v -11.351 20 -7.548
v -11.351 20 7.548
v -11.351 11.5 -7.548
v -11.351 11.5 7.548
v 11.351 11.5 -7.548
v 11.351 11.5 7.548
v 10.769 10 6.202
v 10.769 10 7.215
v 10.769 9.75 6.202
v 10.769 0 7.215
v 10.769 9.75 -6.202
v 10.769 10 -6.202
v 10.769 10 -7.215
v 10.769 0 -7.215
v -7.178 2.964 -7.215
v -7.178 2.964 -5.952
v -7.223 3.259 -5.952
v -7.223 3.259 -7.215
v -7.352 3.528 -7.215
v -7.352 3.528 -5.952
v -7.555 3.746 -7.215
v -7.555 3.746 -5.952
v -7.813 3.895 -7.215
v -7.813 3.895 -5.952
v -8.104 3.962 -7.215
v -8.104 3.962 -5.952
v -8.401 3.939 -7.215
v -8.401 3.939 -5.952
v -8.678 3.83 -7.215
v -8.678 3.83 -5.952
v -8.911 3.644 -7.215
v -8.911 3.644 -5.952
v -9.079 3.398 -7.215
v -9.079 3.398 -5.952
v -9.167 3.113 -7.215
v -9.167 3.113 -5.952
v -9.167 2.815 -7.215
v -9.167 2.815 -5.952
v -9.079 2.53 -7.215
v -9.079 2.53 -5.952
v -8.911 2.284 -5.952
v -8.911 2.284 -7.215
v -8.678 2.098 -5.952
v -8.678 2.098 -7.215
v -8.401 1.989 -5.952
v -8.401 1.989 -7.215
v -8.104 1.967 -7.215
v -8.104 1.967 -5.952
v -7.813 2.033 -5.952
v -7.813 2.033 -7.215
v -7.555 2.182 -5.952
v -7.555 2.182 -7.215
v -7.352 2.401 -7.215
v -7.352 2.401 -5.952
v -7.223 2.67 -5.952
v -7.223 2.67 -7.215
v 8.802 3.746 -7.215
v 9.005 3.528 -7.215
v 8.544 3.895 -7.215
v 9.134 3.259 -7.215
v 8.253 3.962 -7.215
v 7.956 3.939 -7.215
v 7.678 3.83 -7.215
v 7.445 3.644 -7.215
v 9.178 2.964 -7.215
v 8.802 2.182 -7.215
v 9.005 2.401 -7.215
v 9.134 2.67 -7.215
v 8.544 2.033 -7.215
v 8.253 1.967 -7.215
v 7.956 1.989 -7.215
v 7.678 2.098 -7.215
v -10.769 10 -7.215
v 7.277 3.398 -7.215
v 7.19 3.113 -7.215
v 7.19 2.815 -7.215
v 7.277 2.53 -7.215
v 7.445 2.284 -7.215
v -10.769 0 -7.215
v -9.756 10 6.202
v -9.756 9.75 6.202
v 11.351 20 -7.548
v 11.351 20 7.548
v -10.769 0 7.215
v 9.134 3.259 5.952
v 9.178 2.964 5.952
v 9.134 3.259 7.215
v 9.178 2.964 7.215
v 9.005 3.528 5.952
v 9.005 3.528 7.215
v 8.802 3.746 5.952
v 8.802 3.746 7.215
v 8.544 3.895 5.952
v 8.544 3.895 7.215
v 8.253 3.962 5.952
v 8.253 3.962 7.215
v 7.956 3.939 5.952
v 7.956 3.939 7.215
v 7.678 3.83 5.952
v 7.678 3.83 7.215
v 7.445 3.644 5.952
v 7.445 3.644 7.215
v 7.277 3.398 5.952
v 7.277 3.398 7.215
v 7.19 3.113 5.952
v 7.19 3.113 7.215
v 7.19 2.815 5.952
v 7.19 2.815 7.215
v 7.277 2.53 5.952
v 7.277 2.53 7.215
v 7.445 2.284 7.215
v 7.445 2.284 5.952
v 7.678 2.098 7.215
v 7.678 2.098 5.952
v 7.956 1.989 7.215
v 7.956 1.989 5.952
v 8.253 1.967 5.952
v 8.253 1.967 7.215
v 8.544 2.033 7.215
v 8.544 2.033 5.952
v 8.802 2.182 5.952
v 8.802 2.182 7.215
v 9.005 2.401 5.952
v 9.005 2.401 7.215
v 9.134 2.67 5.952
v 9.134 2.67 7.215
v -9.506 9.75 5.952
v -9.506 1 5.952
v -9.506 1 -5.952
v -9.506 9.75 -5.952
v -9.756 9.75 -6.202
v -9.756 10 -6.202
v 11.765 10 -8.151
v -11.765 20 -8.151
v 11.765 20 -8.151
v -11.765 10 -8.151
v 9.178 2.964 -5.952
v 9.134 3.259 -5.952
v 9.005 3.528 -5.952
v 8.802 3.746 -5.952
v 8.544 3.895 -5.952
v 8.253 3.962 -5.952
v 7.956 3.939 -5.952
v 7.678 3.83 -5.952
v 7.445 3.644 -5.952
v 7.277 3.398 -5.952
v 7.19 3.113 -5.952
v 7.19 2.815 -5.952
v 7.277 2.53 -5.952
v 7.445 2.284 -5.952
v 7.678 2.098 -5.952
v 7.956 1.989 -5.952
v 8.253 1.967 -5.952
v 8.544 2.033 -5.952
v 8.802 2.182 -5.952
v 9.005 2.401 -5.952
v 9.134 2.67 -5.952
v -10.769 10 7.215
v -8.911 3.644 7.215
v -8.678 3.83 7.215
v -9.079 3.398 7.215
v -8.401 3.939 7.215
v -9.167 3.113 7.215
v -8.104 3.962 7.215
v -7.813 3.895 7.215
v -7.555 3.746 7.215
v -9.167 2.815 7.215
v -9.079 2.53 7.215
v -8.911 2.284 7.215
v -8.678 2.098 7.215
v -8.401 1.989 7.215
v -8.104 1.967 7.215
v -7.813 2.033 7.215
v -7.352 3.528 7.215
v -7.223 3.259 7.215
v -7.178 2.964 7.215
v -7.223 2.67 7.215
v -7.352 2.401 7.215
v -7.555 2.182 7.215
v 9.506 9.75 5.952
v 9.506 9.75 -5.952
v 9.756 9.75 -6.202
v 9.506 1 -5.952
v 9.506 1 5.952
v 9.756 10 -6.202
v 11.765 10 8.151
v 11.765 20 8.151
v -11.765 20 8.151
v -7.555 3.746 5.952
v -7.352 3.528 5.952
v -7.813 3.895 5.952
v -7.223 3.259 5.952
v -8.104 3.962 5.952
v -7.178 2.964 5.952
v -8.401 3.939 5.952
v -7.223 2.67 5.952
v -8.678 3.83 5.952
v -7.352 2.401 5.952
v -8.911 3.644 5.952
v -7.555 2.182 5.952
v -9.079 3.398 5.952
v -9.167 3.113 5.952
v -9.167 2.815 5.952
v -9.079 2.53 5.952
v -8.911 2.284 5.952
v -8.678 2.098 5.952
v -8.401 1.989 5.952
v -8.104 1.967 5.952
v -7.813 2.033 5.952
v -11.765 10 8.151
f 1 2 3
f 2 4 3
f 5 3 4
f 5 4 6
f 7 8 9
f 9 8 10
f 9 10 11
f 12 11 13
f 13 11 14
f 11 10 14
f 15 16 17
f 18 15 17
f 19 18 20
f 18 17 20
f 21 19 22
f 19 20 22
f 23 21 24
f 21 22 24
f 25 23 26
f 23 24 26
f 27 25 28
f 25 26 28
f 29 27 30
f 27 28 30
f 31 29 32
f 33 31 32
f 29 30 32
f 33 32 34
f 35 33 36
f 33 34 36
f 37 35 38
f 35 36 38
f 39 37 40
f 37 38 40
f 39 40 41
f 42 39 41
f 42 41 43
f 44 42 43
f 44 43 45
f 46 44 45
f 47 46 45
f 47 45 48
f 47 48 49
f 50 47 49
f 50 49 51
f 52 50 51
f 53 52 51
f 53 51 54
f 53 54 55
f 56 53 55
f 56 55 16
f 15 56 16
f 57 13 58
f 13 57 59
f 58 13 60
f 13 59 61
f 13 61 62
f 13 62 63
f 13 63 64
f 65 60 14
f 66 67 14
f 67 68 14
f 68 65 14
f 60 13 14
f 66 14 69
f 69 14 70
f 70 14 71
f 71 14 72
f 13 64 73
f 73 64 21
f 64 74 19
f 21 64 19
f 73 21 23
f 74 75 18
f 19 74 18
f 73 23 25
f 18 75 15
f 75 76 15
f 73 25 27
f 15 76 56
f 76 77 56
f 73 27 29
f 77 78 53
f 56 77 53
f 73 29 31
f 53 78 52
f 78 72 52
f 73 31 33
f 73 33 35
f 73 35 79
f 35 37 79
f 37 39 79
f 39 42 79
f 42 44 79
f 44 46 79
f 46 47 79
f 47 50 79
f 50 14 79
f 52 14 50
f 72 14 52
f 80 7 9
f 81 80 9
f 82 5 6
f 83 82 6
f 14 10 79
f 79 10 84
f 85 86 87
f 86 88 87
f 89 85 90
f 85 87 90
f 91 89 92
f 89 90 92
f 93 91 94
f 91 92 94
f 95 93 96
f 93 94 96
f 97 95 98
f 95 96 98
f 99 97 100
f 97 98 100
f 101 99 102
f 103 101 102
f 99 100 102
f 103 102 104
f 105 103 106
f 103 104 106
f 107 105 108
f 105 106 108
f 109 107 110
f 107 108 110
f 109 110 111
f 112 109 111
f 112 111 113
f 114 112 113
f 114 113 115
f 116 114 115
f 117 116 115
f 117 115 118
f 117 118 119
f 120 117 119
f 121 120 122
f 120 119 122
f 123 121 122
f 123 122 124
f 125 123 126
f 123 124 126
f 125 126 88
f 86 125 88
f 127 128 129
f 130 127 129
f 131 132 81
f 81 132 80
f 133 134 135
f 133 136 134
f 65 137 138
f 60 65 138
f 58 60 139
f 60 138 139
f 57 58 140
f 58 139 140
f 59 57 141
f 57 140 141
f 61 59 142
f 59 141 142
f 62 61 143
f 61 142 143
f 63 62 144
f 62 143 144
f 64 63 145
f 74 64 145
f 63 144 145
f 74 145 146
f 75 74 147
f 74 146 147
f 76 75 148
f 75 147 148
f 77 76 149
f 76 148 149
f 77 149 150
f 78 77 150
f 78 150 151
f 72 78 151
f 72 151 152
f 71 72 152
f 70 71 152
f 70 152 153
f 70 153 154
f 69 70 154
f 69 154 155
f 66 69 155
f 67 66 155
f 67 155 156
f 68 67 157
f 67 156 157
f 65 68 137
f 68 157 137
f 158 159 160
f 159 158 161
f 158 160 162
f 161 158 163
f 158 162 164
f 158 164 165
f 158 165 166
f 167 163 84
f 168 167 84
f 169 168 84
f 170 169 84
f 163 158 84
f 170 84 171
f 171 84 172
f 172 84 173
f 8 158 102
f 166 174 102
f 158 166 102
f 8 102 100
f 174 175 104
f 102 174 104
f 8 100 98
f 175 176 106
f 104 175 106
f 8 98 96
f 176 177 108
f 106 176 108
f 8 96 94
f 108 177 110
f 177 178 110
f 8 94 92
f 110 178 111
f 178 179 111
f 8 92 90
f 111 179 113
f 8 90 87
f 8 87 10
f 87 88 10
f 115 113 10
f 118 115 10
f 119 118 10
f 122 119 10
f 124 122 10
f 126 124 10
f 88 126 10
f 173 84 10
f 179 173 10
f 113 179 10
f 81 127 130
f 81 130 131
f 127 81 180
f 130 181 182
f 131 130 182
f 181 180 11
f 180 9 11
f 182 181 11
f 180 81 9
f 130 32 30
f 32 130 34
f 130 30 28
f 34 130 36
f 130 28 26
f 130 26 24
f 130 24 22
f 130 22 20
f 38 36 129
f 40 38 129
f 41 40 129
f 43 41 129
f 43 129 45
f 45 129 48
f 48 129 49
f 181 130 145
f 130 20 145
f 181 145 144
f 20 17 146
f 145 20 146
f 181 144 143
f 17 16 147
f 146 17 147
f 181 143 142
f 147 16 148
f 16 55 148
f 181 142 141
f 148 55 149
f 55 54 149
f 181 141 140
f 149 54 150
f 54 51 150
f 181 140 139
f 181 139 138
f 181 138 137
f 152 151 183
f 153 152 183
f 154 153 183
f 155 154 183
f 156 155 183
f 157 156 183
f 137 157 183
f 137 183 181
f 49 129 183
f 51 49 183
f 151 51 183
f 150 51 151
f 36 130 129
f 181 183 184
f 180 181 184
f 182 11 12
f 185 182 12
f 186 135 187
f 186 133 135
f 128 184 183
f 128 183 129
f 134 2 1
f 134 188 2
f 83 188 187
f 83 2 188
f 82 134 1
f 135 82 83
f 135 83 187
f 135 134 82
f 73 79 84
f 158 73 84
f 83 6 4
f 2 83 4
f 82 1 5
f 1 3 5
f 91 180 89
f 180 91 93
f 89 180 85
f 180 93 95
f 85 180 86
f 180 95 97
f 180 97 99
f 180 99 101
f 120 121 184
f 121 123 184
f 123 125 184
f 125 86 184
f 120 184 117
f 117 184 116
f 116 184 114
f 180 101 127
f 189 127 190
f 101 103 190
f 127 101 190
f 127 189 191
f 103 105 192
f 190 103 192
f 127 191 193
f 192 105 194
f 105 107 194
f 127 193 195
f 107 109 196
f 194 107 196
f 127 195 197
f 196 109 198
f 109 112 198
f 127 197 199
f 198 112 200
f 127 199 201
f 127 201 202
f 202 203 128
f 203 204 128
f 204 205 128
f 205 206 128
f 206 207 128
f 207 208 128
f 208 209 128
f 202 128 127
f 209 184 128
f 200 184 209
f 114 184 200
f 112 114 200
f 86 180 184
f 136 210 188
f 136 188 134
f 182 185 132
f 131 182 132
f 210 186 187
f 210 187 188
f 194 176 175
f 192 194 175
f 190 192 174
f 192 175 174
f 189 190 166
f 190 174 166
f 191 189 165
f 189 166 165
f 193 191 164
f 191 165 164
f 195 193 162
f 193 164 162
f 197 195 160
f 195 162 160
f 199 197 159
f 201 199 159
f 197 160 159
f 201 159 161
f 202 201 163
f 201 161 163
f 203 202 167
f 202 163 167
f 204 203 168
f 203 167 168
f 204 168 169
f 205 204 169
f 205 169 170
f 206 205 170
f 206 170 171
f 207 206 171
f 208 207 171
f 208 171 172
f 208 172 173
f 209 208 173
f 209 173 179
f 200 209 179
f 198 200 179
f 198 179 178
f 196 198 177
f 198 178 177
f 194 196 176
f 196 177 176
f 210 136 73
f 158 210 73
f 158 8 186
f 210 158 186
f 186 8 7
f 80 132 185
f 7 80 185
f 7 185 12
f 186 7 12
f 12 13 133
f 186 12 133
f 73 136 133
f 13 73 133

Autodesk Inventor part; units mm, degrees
ref_plane "YZ Plane" through (0, 0, 0) normal (1, 0, 0) x (0, 1, 0)
ref_plane "XZ Plane" through (0, 0, 0) normal (0, 1, 0) x (-1, 0, 0)
ref_plane "XY Plane" through (0, 0, 0) normal (0, 0, 1) x (1, 0, 0)
sketch "Sketch1" plane through (0, 0, 0) normal (0, 1, 0) x (-1, 0, 0)
  point P0 (0, 0)
sketch "Sketch2" plane through (0, 0, 0) normal (0, 1, 0) x (-1, 0, 0)
  line L0 (-10.7689, -7.215) -> (10.7689, -7.215)
  line L1 (10.7689, -7.215) -> (10.7689, 7.215)
  line L2 (10.7689, 7.215) -> (-10.7689, 7.215)
  line L3 (-10.7689, 7.215) -> (-10.7689, -7.215)
  line L4 (-10.7689, -7.215) -> (10.7689, 7.215) construction
  line L5 (10.7689, -7.215) -> (-10.7689, 7.215) construction
  line L6 (9.5058, 5.9518) -> (9.5058, -5.9518)
  line L7 (9.5058, -5.9518) -> (-9.5058, -5.9518)
  line L8 (-9.5058, -5.9518) -> (-9.5058, 5.9518)
  line L9 (-9.5058, 5.9518) -> (9.5058, 5.9518)
  point P0 (0, 0)
extrude "Extrusion1" add sketch "Sketch2" along normal blind 10
sketch "Sketch3" plane through (-10.7689, 0, 7.215) normal (0, 0, 1) x (1, 0, 0)
  circle A0 centre (2.5905, 2.9643) radius 1
  line L0 (20.2747, 10) -> (1.2632, 10) projected
  line L1 (10.7689, 10) -> (10.7689, 0)
  circle A1 centre (18.9473, 2.9643) radius 1
  dimension "d2" = 2
extrude "Extrusion2" cut sketch "Sketch3" against normal through all
extrude "Extrusion3" add sketch "Sketch2" along normal blind 1 contours L6 L7 L8 L9
sketch "Sketch4" plane through (10.7689, 0, 7.215) normal (1, 0, 0) x (0, 0, -1)
  line L0 (0, 0) -> (14.4299, 0) projected
  line L1 (14.4299, 0) -> (14.4299, 10) projected
  line L2 (0, 10) -> (14.4299, 10) projected
  line L3 (0, 0) -> (0, 10) projected
  point P0 (7.215, 0)
sketch "Sketch5" plane through (0, 10, 0) normal (0, 1, 0) x (1, 0, 0)
  line L0 (-9.5058, -5.9518) -> (-9.5058, 5.9518) projected
  line L1 (-9.5058, 5.9518) -> (9.5058, 5.9518) projected
  line L2 (9.5058, 5.9518) -> (9.5058, -5.9518) projected
  line L3 (9.5058, -5.9518) -> (-9.5058, -5.9518) projected
  line L4 (-9.7558, 6.2018) -> (-9.7558, -6.2018)
  line L5 (-9.7558, -6.2018) -> (9.7558, -6.2018)
  line L6 (9.7558, -6.2018) -> (9.7558, 6.2018)
  line L7 (9.7558, 6.2018) -> (-9.7558, 6.2018)
  point P0 (0, 0)
  dimension "d8" = 0.25
extrude "Extrusion4" cut sketch "Sketch5" against normal blind 0.25
sketch "Sketch6" plane through (9.7558, 10, -6.2018) normal (-1, 0, 0) x (0, 0, 1)
  line L0 (0, 0) -> (12.4036, 0) projected
  line L1 (0, 0) -> (0, -0.25) projected
  line L2 (0, -0.25) -> (12.4036, -0.25) projected
  line L3 (12.4036, 0) -> (12.4036, -0.25) projected
  point P0 (6.2018, -10)
sketch "Sketch7" plane through (10.7689, 0, 7.215) normal (1, 0, 0) x (0, 0, -1)
  line L0 (0, 10) -> (14.4299, 10) projected
  line L1 (1.0132, 10) -> (1.0132, 9.75) projected
  line L2 (13.4167, 10) -> (1.0132, 10) projected
  line L3 (1.0132, 10) -> (13.4167, 10)
  line L4 (1.0132, 10) -> (13.4167, 10)
  line L5 (1.0132, 10) -> (1.0132, 9.75)
  line L6 (1.0132, 9.75) -> (13.4167, 9.75)
  line L7 (13.4167, 9.75) -> (13.4167, 10)
  line L8 (13.4167, 10) -> (1.0132, 10)
  line L9 (1.0132, 10) -> (13.4167, 10)
  line L10 (13.4167, 10) -> (13.4167, 9.75)
  line L11 (13.4167, 9.75) -> (1.0132, 9.75)
  line L12 (1.0132, 9.75) -> (1.0132, 10)
  point P0 (7.215, 0)
  dimension "d11" = 0.25
extrude "Extrusion5" cut sketch "Sketch7" against normal up to surface (1.0132 mm away)
sketch "Sketch8" plane through (0, 10, 0) normal (0, 1, 0) x (1, 0, 0)
  line L0 (11.7647, -8.1506) -> (-11.7647, -8.1506)
  line L1 (-11.7647, -8.1506) -> (-11.7647, 8.1506)
  line L2 (-11.7647, 8.1506) -> (11.7647, 8.1506)
  line L3 (11.7647, 8.1506) -> (11.7647, -8.1506)
  line L4 (11.7647, -8.1506) -> (-11.7647, 8.1506) construction
  line L5 (-11.7647, -8.1506) -> (11.7647, 8.1506) construction
  line L6 (11.3506, -7.5482) -> (-11.3506, -7.5482)
  line L7 (-11.3506, -7.5482) -> (-11.3506, 7.5482)
  line L8 (-11.3506, 7.5482) -> (11.3506, 7.5482)
  line L9 (11.3506, 7.5482) -> (11.3506, -7.5482)
  line L10 (11.3506, -7.5482) -> (-11.3506, 7.5482) construction
  line L11 (-11.3506, -7.5482) -> (11.3506, 7.5482) construction
  point P0 (0, 0)
extrude "Extrusion6" add sketch "Sketch8" along normal blind 10
sketch "Sketch9" plane through (0, 10, 0) normal (0, 1, 0) x (1, 0, 0)
  line L0 (-9.7558, 6.2018) -> (10.7689, 6.2018) projected
  line L1 (10.7689, 6.2018) -> (10.7689, 7.215) projected
  line L2 (10.7689, 7.215) -> (-10.7689, 7.215) projected
  line L3 (-10.7689, 7.215) -> (-10.7689, -7.215) projected
  line L4 (-10.7689, -7.215) -> (10.7689, -7.215) projected
  line L5 (10.7689, -7.215) -> (10.7689, -6.2018) projected
  line L6 (10.7689, -6.2018) -> (-9.7558, -6.2018) projected
  line L7 (-9.7558, -6.2018) -> (-9.7558, 6.2018) projected
  line L8 (10.7689, -7.215) -> (-10.7689, -7.215)
  line L9 (-10.7689, -7.215) -> (-10.7689, 7.215)
  line L10 (-10.7689, 7.215) -> (10.7689, 7.215)
  line L11 (10.7689, 7.215) -> (10.7689, -7.215)
  line L12 (10.7689, -7.215) -> (-10.7689, 7.215) construction
  line L13 (-10.7689, -7.215) -> (10.7689, 7.215) construction
  point P0 (0, 0)
extrude "Extrusion7" add sketch "Sketch8" along normal blind 1.5 contours L6 L7 L8 L9
properties part number "base_box"
